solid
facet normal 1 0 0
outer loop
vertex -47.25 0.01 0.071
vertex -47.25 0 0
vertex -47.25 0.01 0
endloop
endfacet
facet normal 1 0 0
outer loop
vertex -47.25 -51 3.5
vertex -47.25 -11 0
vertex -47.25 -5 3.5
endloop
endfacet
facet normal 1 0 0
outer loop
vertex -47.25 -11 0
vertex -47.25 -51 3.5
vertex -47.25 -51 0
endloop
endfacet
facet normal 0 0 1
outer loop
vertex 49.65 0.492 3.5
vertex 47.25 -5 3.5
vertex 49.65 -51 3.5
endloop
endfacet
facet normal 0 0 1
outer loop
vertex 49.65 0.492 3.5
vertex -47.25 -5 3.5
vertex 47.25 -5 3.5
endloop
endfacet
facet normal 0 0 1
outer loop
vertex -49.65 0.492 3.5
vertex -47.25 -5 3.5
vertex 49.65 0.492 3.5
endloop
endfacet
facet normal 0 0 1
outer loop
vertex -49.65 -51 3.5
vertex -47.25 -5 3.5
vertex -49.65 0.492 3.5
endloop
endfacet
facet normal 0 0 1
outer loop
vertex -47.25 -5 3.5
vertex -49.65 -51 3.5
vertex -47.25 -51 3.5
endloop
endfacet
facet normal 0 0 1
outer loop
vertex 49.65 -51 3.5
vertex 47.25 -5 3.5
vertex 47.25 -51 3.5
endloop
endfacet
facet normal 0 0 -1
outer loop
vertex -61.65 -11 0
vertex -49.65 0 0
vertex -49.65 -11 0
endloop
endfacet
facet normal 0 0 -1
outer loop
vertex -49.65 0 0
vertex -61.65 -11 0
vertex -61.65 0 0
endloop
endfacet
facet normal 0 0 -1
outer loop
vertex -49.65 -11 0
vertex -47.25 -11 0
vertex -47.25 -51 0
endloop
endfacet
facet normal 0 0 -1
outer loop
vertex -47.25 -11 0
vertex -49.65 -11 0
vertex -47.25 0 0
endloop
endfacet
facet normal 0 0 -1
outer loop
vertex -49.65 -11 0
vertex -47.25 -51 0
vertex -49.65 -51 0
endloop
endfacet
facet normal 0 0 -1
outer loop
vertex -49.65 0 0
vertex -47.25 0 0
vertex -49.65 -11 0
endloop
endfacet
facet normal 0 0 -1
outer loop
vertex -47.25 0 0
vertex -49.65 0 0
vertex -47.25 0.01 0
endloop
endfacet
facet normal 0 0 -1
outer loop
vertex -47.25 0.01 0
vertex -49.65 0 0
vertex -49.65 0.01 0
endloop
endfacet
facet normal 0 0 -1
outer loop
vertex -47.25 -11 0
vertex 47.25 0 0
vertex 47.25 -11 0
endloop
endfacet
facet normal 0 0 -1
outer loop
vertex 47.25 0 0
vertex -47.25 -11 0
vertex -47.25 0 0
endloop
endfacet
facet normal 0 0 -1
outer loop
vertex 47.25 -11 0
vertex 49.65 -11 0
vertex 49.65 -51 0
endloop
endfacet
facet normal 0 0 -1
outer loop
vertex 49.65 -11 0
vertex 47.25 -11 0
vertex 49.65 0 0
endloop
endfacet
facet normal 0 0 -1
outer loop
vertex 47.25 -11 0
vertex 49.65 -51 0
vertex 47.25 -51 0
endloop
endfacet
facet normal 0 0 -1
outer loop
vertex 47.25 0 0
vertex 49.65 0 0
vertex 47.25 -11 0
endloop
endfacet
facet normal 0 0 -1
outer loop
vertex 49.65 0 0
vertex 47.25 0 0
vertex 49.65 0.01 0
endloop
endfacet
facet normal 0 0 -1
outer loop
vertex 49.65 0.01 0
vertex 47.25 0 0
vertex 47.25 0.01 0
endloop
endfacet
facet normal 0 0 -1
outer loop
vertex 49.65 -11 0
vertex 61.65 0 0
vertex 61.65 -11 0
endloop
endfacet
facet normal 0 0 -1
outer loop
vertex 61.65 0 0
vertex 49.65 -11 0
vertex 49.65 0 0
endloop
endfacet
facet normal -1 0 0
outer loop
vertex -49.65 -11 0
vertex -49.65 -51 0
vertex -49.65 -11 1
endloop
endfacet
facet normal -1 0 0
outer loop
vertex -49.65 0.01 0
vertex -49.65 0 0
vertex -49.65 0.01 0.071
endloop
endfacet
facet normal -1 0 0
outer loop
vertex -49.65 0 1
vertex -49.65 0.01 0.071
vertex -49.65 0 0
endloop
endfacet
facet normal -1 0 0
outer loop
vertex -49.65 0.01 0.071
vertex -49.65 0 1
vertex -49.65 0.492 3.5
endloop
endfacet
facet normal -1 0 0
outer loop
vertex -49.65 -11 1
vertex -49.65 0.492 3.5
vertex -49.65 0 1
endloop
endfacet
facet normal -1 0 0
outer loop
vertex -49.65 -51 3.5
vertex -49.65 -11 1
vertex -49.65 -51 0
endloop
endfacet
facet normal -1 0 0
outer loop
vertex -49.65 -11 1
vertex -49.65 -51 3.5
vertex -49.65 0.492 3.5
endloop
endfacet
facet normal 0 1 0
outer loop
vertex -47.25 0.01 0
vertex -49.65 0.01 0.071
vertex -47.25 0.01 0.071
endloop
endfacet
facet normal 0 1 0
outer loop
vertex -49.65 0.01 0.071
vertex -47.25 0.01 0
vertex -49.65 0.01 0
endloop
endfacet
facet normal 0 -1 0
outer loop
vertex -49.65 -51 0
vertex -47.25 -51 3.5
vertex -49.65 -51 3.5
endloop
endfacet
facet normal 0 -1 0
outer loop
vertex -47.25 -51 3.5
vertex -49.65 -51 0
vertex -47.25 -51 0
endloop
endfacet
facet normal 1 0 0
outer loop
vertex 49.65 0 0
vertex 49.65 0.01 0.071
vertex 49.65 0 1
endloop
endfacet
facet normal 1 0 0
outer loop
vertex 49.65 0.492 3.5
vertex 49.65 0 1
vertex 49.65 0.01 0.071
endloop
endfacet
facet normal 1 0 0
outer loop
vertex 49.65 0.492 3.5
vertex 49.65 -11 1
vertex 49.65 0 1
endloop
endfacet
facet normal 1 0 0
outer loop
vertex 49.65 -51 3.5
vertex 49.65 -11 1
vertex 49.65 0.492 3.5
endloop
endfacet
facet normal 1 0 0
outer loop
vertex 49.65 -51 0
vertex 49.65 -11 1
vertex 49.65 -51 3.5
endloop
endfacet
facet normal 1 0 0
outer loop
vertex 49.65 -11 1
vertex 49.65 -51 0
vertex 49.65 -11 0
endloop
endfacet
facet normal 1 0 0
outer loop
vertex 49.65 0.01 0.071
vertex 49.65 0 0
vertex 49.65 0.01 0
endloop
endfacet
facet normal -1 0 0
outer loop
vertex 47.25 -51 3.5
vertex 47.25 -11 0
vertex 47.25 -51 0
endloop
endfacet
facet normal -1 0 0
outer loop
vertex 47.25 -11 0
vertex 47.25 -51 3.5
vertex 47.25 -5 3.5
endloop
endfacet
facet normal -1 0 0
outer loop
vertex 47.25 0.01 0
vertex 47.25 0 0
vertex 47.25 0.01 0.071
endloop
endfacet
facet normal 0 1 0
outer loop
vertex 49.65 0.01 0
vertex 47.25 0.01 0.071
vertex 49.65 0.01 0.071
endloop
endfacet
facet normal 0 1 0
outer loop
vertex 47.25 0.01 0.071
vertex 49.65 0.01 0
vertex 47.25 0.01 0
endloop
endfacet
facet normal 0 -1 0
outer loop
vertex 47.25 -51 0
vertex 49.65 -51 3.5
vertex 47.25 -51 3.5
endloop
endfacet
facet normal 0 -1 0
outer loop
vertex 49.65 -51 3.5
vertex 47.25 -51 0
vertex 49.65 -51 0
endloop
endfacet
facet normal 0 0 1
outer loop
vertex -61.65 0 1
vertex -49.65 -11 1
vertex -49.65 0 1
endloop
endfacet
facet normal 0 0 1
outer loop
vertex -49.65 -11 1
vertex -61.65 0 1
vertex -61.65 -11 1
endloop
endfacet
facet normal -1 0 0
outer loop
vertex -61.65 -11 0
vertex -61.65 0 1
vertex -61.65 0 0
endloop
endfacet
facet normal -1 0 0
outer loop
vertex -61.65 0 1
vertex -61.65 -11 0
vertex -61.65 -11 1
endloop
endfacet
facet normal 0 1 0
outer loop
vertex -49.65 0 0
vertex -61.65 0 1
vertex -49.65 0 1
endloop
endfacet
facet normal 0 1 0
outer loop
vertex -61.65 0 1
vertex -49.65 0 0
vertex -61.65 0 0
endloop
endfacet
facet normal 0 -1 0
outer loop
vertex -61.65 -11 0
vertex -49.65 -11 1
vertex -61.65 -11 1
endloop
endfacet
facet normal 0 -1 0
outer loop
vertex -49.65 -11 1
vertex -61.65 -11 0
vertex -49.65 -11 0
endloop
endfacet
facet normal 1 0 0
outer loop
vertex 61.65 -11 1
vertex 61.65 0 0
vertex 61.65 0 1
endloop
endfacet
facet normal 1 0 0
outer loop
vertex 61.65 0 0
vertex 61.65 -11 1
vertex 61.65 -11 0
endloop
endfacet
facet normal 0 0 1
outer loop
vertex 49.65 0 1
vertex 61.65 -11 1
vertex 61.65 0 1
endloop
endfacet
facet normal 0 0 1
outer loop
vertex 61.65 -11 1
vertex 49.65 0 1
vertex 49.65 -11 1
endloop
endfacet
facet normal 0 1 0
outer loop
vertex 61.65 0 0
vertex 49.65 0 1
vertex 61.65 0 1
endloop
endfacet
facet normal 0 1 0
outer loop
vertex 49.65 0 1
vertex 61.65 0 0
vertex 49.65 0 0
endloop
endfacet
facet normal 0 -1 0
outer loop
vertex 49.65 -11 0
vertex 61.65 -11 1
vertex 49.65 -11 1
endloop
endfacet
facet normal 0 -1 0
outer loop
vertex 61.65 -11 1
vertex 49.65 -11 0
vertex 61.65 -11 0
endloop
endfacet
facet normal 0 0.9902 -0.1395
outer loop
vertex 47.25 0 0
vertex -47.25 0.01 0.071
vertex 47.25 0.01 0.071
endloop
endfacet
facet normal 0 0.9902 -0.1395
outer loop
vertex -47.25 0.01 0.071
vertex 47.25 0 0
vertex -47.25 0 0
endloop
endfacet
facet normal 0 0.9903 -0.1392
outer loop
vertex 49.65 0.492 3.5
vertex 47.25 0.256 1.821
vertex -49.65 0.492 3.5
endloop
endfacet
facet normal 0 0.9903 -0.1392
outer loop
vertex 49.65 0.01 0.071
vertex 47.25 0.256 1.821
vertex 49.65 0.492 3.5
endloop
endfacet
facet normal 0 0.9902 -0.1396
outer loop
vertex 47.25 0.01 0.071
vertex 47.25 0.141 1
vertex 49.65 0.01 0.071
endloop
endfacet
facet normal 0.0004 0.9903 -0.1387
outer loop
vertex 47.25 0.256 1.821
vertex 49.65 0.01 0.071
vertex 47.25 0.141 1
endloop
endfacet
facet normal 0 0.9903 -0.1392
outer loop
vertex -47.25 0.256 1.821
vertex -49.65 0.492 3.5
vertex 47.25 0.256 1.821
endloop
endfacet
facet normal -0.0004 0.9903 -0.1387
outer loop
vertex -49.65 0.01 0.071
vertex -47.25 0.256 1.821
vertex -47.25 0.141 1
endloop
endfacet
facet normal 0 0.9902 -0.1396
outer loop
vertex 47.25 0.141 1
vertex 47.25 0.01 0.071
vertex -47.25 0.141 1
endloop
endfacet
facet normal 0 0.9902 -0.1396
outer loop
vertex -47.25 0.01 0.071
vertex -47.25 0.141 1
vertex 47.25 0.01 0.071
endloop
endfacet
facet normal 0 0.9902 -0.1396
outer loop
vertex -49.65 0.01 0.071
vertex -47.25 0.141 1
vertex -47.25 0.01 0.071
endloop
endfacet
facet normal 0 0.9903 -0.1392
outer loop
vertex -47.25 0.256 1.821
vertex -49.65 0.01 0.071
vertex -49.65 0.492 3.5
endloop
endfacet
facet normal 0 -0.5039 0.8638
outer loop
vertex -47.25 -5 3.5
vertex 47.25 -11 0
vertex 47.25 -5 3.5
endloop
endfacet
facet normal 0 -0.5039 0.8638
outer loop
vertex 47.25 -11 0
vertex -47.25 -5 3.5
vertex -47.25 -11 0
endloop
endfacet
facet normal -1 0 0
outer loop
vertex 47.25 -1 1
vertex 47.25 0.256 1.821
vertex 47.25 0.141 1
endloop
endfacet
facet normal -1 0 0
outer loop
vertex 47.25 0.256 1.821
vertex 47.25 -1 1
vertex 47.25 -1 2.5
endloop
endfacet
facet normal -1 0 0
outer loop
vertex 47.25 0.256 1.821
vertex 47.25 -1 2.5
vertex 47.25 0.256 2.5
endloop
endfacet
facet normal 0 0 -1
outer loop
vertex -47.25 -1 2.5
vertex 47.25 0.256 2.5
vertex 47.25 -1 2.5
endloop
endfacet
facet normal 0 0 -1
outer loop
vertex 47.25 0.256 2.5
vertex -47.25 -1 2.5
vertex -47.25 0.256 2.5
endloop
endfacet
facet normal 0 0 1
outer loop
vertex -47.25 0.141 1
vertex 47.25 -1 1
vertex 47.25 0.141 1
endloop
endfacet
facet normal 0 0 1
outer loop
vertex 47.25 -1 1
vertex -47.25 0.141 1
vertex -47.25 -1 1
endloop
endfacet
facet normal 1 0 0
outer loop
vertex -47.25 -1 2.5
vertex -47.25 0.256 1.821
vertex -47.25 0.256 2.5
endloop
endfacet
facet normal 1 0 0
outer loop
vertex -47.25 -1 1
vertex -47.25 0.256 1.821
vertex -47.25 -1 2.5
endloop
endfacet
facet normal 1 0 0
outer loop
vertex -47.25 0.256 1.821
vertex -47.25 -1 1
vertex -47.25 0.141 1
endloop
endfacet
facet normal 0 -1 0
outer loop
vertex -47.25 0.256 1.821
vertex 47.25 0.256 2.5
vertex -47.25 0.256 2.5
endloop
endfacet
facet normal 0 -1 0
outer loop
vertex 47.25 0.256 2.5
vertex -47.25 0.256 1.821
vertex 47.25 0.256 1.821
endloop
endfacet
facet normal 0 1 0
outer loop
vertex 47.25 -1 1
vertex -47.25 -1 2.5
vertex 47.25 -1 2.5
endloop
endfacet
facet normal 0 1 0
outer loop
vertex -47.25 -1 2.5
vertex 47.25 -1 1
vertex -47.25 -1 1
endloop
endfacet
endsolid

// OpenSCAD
// Flip fence: a low rigid lip that catches one long edge of a card so the magnet can turn the card over like a page
// (README, "Flipping a card (edge flip)"). Tape it to the bed; it is NOT a hand-rack or deck part. Units: mm.
//
// Plan view (bed Y is up the page, the fence runs along X):
//        card waits here  (+Y)        catching face  y = 0   (leans 8 deg over the card: an undercut)
//        ==================================================  <- lip, fence_h tall
//        landing zone (-Y): two guide rails the card falls between, and a short ramp behind the lip
// The origin is the middle of the catching face at the bed (x = 0, y = 0, z = 0), so the STL drops straight onto its spot.
//
// card_l is the card's LONG edge, which lies along the fence; the gap between the rails is card_l + 2 * clear.

card_l    = 92.5;     // sleeved card, long edge (same numbers as deck_box.scad / hand_rack.scad: measure yours)
clear     = 1.0;      // each side of the card in the landing zone
fence_h   = 3.5;      // lip height; higher catches the edge better but needs a higher lift to pass over
undercut  = 8;        // degrees the catching face leans over the card
base_d    = 5;        // lip thickness behind the face
ramp_d    = 6;        // the rear slope: a card edge that comes to rest on it slides off
rail_t    = 2.4;
rail_len  = 51;       // rails run from the face into the landing zone (about a card's half width plus the ramp)
tab_w     = 12;       // tape-down tabs at each end, outside the card's reach
tab_t     = 1.0;
groove_h  = 1.5;      // a groove in the face for a self-adhesive silicone or grip strip (1 mm deep)

inner = card_l + 2 * clear;
total = inner + 2 * rail_t;
uc    = fence_h * tan(undercut);
rear  = base_d + ramp_d;

module profile() { polygon([[-rear, 0], [0, 0], [uc, fence_h], [-base_d, fence_h]]); }   // (y, z)

difference() {
    union() {
        translate([-total / 2, 0, 0]) rotate([90, 0, 90]) linear_extrude(height = total) profile();
        for (s = [-1, 1])
            translate([s * (inner / 2 + rail_t / 2) - rail_t / 2, -rail_len, 0]) cube([rail_t, rail_len + uc * 0 + 0.01, fence_h]);
        for (s = [-1, 1])                                             // tabs lie on the bed OUTSIDE the rails
            translate([s > 0 ? total / 2 : -total / 2 - tab_w, -rear, 0]) cube([tab_w, rear, tab_t]);
    }
    translate([-inner / 2, -1, (fence_h - groove_h) / 2]) cube([inner, 1 + uc / 2 + 0.01, groove_h]);   // 1 mm into the face
}
